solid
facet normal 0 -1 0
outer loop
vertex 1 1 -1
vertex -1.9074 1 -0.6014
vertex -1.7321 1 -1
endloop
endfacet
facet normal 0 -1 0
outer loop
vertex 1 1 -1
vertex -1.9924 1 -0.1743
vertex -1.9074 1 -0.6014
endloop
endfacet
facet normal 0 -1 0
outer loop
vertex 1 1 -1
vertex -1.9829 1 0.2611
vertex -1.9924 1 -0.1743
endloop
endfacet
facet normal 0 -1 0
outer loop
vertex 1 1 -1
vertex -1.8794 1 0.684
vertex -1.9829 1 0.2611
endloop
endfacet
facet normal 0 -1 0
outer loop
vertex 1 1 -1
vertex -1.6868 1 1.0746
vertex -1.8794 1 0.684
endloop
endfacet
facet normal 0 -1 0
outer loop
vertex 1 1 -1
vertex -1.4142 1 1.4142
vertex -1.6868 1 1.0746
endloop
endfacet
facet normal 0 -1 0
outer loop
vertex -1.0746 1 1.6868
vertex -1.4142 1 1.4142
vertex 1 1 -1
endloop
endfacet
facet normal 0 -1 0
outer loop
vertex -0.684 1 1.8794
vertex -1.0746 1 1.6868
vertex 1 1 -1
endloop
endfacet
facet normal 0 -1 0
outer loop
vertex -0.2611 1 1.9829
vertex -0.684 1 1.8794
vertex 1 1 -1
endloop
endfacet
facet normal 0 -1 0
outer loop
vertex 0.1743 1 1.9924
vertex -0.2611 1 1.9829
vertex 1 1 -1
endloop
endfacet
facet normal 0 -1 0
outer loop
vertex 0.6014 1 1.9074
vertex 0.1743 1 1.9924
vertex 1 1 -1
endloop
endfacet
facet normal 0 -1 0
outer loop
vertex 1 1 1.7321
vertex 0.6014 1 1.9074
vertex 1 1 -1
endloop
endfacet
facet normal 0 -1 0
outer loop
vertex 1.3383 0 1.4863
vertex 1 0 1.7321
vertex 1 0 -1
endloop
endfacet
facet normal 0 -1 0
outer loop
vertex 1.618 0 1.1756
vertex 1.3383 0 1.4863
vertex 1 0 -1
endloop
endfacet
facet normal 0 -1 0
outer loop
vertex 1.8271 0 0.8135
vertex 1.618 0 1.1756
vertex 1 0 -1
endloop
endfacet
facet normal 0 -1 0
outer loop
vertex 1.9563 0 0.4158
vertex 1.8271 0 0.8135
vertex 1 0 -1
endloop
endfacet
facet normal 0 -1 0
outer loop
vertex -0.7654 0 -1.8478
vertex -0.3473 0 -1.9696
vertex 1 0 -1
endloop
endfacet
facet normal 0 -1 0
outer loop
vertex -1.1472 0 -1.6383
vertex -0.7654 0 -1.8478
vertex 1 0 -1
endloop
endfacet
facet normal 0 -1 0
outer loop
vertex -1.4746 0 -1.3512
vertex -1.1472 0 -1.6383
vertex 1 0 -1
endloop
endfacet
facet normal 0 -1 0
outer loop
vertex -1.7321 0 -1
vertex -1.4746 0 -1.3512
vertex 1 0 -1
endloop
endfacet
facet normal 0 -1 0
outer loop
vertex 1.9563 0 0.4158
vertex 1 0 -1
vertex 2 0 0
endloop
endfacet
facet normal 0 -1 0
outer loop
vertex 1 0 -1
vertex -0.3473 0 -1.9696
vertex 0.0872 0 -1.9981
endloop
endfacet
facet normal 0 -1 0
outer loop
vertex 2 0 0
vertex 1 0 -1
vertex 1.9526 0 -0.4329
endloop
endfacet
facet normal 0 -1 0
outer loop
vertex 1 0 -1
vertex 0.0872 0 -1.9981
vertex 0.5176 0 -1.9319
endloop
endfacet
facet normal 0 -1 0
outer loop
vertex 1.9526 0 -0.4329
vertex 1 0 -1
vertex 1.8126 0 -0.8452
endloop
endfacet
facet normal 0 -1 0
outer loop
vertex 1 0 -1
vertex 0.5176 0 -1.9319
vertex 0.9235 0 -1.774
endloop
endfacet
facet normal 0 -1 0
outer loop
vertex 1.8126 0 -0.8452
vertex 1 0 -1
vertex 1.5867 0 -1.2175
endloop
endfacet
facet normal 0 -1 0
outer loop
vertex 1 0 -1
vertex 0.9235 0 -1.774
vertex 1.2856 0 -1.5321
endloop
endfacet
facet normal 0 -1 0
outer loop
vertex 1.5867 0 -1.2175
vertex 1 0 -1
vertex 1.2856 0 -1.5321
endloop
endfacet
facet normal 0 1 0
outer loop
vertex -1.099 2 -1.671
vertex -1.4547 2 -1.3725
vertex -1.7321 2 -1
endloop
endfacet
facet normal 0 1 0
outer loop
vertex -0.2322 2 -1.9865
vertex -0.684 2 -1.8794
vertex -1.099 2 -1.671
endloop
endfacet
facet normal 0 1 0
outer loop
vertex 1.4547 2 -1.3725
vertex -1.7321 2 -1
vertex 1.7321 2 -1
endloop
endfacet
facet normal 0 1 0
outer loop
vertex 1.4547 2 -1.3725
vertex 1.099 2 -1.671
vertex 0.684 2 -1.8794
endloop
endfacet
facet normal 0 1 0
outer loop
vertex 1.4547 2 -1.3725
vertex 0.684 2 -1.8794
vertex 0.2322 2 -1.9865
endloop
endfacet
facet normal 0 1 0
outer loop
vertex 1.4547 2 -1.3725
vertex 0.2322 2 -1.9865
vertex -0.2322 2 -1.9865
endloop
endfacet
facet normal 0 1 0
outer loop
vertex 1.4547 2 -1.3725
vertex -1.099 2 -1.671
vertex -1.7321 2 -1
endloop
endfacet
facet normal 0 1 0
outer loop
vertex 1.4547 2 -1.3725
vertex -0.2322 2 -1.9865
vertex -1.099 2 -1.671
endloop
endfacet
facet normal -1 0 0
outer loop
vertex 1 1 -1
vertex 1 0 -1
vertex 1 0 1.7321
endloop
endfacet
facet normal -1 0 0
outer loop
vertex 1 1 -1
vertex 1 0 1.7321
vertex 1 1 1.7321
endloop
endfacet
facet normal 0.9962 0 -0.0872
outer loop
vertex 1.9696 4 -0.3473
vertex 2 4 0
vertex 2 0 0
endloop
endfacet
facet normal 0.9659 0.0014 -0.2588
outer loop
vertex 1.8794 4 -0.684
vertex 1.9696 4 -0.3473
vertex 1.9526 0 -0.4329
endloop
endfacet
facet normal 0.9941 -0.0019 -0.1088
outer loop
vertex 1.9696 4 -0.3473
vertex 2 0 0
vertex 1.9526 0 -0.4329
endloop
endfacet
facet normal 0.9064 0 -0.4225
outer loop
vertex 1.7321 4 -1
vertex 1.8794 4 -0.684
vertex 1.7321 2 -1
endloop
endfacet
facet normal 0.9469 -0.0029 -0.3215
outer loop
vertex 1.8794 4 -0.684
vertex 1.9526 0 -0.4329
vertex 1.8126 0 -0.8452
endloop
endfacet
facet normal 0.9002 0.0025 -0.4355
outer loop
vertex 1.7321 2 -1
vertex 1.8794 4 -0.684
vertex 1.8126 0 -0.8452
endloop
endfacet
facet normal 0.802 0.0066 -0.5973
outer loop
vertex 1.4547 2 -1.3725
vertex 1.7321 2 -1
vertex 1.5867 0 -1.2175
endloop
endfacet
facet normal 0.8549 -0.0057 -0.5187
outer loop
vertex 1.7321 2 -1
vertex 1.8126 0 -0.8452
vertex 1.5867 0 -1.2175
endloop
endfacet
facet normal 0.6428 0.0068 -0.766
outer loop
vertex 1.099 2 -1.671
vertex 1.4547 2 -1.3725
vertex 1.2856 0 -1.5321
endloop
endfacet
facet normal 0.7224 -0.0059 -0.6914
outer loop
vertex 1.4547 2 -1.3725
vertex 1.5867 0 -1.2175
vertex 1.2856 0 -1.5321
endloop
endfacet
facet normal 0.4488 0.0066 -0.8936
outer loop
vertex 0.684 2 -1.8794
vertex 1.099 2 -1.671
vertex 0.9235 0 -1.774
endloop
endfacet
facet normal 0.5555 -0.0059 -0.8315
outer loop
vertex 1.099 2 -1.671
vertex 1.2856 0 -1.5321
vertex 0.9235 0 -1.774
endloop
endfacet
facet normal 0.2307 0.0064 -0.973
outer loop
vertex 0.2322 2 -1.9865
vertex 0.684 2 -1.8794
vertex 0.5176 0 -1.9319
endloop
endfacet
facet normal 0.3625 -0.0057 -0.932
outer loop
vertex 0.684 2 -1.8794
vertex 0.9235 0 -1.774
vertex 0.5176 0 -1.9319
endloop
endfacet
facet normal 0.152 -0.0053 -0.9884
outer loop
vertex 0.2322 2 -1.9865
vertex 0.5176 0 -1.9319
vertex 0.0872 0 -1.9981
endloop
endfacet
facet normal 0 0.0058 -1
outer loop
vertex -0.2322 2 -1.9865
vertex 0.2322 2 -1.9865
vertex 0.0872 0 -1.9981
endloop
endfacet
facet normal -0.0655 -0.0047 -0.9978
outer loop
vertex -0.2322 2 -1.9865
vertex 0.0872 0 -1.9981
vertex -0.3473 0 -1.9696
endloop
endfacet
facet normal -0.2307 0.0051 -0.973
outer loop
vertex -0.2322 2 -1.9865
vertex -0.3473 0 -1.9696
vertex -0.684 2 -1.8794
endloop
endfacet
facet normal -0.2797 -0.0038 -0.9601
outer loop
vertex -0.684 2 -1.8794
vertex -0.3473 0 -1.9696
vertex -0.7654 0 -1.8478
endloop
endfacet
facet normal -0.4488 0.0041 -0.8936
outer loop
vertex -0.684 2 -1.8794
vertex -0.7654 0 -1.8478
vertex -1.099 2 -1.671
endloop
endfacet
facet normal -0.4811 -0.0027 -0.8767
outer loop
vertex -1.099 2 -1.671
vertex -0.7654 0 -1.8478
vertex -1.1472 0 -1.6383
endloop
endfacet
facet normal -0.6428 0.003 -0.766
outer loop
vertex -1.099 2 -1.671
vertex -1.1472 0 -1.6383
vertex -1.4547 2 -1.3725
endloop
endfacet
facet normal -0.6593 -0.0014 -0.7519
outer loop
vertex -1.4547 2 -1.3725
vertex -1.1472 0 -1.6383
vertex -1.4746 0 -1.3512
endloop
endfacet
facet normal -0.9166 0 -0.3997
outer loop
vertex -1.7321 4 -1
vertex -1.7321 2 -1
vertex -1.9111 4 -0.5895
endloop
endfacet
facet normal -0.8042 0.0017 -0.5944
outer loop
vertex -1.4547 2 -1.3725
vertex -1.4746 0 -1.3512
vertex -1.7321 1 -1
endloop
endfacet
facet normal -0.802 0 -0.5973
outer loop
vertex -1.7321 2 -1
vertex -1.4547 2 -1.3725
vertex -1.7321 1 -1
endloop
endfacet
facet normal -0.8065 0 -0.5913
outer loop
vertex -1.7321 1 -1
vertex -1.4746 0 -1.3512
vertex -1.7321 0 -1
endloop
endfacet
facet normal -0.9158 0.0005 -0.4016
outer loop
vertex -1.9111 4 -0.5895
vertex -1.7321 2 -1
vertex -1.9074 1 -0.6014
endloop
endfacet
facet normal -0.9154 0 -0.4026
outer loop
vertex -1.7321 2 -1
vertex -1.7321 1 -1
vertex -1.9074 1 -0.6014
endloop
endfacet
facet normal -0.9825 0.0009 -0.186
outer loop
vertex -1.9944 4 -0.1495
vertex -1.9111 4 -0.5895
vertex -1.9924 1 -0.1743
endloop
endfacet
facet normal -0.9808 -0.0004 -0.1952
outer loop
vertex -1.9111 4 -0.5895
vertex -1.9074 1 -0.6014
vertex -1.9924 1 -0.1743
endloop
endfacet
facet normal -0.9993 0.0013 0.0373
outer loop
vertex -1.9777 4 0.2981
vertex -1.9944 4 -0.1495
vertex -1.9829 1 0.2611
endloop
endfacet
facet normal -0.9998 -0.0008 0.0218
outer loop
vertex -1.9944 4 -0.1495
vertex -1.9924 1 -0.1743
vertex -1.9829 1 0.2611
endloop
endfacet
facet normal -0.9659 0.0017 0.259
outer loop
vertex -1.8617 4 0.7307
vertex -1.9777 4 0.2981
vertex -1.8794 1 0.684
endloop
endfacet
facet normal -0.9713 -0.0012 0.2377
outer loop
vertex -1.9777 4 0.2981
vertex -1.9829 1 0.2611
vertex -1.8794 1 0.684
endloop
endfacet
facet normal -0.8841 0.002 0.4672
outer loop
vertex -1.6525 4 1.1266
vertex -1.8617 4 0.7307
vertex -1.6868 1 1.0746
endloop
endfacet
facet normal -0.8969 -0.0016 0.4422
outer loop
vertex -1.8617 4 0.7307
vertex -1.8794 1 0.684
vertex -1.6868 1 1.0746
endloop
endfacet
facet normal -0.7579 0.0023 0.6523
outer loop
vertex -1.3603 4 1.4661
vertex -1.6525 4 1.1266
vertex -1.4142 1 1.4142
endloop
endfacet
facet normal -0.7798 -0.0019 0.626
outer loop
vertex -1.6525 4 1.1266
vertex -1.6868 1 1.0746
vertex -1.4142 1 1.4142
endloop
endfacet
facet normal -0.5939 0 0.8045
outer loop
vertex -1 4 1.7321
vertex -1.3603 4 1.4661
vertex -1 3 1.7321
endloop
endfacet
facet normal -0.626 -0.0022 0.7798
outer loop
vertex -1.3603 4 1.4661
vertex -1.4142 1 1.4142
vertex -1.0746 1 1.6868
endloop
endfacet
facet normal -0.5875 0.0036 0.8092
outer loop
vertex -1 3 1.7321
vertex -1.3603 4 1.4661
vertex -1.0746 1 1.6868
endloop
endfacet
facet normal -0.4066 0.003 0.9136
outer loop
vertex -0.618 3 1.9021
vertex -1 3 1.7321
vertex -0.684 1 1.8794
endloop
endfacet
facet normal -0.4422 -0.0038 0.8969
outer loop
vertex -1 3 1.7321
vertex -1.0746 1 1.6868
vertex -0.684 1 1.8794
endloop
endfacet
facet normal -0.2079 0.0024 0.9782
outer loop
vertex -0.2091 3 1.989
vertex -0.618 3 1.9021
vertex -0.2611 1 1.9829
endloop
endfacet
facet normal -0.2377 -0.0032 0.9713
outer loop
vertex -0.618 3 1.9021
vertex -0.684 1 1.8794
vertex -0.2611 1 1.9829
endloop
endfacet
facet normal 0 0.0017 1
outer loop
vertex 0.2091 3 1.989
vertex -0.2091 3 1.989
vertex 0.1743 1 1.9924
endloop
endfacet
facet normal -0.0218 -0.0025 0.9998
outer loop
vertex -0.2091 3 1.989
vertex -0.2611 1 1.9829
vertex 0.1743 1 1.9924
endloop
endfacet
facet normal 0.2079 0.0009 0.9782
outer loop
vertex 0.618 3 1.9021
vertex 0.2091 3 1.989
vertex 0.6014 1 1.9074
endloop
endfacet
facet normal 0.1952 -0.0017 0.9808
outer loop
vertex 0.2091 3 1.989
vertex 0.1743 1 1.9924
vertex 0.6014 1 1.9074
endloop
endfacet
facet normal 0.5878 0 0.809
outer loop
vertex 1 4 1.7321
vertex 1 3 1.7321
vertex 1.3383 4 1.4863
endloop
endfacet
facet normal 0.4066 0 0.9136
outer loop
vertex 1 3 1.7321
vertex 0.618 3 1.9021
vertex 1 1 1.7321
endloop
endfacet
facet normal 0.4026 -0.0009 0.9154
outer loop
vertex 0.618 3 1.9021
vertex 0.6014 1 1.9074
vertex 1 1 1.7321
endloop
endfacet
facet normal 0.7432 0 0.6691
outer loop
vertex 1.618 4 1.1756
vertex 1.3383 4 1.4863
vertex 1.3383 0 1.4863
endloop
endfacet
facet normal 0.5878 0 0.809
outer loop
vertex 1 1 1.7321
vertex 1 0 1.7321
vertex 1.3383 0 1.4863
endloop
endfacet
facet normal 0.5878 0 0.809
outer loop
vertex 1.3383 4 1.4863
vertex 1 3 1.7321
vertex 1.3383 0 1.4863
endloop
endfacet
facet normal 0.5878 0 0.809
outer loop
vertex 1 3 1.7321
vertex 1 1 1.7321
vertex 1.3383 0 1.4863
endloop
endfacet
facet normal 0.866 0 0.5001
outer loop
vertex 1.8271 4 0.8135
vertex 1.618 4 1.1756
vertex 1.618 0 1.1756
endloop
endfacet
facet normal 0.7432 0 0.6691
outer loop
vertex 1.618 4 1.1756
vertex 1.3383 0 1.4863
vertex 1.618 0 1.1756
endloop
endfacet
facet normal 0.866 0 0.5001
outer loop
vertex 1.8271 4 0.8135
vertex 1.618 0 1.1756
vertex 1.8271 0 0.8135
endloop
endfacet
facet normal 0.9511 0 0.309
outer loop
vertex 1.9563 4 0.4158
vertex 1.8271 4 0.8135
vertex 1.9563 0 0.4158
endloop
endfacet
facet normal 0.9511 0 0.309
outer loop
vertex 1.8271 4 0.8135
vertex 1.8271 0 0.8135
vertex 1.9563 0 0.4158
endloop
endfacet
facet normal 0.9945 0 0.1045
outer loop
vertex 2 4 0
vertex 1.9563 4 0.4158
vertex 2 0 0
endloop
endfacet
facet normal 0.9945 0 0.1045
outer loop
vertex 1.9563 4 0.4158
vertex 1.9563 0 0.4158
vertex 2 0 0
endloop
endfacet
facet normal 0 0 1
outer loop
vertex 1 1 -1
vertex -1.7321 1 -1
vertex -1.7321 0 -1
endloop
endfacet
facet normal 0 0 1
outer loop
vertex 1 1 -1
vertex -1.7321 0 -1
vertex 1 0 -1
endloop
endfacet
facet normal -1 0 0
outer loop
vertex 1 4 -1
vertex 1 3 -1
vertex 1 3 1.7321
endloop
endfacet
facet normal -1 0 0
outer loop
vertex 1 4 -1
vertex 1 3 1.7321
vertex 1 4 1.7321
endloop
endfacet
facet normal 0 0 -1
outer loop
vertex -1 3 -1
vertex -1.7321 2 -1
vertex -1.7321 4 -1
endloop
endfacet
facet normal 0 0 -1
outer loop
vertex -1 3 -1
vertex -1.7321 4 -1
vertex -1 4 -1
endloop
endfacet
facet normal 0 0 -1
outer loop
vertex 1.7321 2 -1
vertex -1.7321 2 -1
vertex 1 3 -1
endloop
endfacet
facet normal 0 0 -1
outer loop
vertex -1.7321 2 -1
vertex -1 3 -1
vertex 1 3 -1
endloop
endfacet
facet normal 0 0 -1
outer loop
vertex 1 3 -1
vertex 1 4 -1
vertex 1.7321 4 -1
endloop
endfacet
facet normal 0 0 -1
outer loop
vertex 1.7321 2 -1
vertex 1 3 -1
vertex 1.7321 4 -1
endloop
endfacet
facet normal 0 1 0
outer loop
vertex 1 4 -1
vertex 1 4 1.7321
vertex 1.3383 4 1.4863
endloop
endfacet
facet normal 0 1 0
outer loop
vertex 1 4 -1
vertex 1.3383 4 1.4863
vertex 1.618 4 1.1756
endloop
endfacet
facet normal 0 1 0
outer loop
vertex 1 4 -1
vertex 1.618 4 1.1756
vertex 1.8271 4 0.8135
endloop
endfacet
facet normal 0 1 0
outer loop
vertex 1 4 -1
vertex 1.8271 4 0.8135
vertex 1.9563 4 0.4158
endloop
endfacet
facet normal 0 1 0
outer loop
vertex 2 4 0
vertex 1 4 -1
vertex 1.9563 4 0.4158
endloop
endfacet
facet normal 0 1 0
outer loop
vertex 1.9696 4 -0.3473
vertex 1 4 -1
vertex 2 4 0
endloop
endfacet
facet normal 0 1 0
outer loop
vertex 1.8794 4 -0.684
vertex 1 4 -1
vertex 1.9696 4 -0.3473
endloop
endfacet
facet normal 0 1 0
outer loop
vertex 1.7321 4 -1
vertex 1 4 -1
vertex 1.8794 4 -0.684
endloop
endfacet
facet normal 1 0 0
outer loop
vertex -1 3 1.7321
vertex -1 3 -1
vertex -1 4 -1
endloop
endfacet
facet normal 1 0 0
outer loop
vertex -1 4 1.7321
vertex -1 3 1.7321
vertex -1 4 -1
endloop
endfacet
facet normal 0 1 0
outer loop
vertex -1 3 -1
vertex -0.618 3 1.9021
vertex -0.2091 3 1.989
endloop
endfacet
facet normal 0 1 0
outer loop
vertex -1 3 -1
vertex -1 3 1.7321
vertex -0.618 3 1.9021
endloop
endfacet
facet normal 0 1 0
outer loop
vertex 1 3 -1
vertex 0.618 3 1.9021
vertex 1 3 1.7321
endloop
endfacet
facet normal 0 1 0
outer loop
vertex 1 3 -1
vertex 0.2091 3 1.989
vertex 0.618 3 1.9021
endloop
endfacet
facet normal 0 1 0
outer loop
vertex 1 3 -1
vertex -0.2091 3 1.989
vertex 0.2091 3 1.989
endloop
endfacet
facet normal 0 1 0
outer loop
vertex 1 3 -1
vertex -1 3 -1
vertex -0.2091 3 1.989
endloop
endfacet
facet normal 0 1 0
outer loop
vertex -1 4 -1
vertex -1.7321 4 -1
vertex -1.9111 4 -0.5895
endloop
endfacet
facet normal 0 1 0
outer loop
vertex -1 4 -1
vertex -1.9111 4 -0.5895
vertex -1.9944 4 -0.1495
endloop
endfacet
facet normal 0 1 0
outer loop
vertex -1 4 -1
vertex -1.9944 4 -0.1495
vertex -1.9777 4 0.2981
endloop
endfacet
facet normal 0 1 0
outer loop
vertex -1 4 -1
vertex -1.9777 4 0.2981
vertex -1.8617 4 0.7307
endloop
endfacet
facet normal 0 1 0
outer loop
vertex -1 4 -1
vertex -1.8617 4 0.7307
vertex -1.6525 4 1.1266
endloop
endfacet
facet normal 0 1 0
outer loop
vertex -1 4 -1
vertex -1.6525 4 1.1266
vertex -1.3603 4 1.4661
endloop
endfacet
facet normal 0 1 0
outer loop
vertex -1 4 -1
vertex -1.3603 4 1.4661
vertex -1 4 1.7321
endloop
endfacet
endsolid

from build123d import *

# Parameters (mm, degrees)
SKETCH1_R               = 2
BOSS_EXTRUDE1_DEPTH     = 4
SKETCH2_W               = 2
SKETCH2_H               = 1
SKETCH2_W_2             = 3
CUT_EXTRUDE1_DEPTH      = 3
CUT_EXTRUDE1_DEPTH_BACK = 1
CUT_EXTRUDE2_DEPTH      = 2


with BuildPart() as part:
    # Sketch1 → Boss-Extrude1 (new body)
    with BuildSketch(Plane(origin=(0, 0, 0), x_dir=(1, 0, 0), z_dir=(0, 1, 0))):
        Circle(SKETCH1_R)
    extrude(amount=BOSS_EXTRUDE1_DEPTH)

    # Sketch2 → Cut-Extrude1 (cut, two sides)
    with BuildSketch(Plane.XY) as cut_extrude1_sk:
        with Locations((0, 3.5)):
            Rectangle(SKETCH2_W, SKETCH2_H)
        with Locations((-0.5, 0.5)):
            Rectangle(SKETCH2_W_2, SKETCH2_H)
    extrude(amount=CUT_EXTRUDE1_DEPTH, mode=Mode.SUBTRACT)
    extrude(cut_extrude1_sk.sketch, amount=-CUT_EXTRUDE1_DEPTH_BACK, mode=Mode.SUBTRACT)

    # Sketch3 → Cut-Extrude2 (cut)
    with BuildSketch(Plane(origin=(0, 4, 0), x_dir=(1, 0, 0), z_dir=(0, 1, 0))):
        with BuildLine():
            Line((-1.732050808, 1), (1.732050808, 1))
            ThreePointArc((1.732050808, 1), (0, 2), (-1.732050808, 1))
        make_face()
    extrude(amount=-CUT_EXTRUDE2_DEPTH, mode=Mode.SUBTRACT)


solid = part.part
